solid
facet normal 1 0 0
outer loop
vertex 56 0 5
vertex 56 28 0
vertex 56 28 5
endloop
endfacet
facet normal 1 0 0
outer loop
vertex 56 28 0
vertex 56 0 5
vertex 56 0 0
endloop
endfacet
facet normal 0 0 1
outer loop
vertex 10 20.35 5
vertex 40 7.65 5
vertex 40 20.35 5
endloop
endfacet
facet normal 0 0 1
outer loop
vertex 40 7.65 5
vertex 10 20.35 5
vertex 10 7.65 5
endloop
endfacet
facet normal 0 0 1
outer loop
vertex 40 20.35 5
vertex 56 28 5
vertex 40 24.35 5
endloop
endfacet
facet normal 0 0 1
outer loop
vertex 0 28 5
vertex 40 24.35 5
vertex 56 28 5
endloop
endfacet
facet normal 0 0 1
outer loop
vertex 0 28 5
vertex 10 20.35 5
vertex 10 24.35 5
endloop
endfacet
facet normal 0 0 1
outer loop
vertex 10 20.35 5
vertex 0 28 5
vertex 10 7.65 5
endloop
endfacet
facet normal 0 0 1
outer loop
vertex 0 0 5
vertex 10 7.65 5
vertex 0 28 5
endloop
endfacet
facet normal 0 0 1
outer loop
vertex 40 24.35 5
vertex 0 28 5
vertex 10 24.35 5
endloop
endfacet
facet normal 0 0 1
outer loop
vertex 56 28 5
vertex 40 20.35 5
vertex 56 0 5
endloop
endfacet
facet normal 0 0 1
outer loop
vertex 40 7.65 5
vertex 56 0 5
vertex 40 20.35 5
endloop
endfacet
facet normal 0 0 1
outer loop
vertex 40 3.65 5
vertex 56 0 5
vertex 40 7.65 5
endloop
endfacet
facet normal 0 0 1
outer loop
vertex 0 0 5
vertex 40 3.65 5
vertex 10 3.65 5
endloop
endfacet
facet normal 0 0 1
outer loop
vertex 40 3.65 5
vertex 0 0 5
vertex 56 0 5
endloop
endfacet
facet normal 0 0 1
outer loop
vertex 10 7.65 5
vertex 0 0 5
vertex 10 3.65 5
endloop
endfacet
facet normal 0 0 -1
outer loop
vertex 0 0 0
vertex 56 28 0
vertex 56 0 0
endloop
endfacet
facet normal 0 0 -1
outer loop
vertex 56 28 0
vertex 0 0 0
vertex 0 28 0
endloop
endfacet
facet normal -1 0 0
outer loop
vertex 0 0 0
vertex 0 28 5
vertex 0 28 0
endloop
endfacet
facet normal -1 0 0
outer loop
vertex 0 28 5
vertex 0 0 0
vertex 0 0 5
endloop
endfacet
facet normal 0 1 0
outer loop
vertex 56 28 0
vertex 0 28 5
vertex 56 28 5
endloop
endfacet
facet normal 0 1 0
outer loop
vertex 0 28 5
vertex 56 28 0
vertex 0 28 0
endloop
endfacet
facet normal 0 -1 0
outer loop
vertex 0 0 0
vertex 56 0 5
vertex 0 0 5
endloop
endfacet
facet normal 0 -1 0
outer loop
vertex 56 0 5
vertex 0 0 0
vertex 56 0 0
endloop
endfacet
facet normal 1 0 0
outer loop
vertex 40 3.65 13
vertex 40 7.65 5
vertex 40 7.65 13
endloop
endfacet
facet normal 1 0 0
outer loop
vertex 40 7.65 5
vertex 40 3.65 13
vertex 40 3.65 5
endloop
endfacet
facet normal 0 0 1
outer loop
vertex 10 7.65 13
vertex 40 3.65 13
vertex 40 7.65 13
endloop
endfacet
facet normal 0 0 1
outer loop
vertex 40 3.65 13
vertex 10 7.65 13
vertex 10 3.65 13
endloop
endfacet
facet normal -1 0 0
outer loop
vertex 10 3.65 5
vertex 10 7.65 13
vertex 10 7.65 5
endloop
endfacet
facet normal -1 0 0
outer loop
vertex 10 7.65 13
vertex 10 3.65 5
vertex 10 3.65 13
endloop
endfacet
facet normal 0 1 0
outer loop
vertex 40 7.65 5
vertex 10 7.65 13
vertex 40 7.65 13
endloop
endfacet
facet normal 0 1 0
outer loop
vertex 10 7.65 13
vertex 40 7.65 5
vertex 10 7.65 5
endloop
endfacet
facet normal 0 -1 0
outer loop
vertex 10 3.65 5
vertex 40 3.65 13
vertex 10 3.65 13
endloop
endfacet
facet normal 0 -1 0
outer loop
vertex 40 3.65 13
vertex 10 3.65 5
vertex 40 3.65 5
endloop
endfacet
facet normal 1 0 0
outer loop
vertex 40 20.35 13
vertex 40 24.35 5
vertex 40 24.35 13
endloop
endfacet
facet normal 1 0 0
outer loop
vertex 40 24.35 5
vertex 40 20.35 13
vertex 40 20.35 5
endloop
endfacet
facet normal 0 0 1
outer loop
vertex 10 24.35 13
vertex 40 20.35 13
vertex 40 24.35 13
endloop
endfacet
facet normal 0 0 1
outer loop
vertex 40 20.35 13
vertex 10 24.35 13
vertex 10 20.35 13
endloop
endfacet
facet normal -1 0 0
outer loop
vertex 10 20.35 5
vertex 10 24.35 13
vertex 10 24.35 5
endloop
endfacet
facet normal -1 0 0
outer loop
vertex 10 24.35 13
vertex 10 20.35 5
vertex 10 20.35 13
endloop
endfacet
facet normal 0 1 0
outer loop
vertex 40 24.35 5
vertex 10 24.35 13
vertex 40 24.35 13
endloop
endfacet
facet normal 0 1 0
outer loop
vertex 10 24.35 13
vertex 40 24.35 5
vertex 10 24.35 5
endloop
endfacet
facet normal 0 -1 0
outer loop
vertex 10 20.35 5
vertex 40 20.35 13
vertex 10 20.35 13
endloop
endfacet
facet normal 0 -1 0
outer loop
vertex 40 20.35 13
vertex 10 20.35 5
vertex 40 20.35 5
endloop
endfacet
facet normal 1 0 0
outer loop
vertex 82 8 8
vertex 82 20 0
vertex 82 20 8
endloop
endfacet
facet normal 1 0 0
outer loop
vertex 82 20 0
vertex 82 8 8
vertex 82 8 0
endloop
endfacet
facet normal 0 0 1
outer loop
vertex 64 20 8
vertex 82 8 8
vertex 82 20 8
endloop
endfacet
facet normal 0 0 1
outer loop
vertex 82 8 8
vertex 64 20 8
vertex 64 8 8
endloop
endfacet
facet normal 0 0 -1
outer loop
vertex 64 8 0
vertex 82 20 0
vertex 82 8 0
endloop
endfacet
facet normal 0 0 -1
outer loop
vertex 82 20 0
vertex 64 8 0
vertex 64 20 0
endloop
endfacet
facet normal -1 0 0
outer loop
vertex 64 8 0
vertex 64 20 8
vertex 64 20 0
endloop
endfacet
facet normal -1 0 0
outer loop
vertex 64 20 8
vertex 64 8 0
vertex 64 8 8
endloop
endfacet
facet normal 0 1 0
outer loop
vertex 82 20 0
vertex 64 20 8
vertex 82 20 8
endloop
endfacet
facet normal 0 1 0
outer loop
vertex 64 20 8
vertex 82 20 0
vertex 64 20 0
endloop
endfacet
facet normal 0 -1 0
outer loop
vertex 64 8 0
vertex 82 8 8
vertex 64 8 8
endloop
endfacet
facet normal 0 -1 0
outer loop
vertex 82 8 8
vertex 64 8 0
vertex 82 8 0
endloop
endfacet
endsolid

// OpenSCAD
$fn = 48;

base_length = 56;
base_width = 28;
base_thickness = 5;
rail_height = 8;
rail_thickness = 4;
carriage_width = 12;
clearance_per_side = 0.35;
carriage_length = 18;
carriage_height = 8;

channel_width = carriage_width + clearance_per_side * 2;
outer_width = channel_width + rail_thickness * 2;

module base_coupon() {
    difference() {
        union() {
            cube([base_length, base_width, base_thickness]);
            translate([10, (base_width - outer_width) / 2, base_thickness])
                cube([30, rail_thickness, rail_height]);
            translate([10, (base_width + channel_width) / 2, base_thickness])
                cube([30, rail_thickness, rail_height]);
        }
    }
}

module carriage_coupon() {
    cube([carriage_length, carriage_width, carriage_height]);
}

base_coupon();
translate([base_length + 8, (base_width - carriage_width) / 2, 0])
    carriage_coupon();
